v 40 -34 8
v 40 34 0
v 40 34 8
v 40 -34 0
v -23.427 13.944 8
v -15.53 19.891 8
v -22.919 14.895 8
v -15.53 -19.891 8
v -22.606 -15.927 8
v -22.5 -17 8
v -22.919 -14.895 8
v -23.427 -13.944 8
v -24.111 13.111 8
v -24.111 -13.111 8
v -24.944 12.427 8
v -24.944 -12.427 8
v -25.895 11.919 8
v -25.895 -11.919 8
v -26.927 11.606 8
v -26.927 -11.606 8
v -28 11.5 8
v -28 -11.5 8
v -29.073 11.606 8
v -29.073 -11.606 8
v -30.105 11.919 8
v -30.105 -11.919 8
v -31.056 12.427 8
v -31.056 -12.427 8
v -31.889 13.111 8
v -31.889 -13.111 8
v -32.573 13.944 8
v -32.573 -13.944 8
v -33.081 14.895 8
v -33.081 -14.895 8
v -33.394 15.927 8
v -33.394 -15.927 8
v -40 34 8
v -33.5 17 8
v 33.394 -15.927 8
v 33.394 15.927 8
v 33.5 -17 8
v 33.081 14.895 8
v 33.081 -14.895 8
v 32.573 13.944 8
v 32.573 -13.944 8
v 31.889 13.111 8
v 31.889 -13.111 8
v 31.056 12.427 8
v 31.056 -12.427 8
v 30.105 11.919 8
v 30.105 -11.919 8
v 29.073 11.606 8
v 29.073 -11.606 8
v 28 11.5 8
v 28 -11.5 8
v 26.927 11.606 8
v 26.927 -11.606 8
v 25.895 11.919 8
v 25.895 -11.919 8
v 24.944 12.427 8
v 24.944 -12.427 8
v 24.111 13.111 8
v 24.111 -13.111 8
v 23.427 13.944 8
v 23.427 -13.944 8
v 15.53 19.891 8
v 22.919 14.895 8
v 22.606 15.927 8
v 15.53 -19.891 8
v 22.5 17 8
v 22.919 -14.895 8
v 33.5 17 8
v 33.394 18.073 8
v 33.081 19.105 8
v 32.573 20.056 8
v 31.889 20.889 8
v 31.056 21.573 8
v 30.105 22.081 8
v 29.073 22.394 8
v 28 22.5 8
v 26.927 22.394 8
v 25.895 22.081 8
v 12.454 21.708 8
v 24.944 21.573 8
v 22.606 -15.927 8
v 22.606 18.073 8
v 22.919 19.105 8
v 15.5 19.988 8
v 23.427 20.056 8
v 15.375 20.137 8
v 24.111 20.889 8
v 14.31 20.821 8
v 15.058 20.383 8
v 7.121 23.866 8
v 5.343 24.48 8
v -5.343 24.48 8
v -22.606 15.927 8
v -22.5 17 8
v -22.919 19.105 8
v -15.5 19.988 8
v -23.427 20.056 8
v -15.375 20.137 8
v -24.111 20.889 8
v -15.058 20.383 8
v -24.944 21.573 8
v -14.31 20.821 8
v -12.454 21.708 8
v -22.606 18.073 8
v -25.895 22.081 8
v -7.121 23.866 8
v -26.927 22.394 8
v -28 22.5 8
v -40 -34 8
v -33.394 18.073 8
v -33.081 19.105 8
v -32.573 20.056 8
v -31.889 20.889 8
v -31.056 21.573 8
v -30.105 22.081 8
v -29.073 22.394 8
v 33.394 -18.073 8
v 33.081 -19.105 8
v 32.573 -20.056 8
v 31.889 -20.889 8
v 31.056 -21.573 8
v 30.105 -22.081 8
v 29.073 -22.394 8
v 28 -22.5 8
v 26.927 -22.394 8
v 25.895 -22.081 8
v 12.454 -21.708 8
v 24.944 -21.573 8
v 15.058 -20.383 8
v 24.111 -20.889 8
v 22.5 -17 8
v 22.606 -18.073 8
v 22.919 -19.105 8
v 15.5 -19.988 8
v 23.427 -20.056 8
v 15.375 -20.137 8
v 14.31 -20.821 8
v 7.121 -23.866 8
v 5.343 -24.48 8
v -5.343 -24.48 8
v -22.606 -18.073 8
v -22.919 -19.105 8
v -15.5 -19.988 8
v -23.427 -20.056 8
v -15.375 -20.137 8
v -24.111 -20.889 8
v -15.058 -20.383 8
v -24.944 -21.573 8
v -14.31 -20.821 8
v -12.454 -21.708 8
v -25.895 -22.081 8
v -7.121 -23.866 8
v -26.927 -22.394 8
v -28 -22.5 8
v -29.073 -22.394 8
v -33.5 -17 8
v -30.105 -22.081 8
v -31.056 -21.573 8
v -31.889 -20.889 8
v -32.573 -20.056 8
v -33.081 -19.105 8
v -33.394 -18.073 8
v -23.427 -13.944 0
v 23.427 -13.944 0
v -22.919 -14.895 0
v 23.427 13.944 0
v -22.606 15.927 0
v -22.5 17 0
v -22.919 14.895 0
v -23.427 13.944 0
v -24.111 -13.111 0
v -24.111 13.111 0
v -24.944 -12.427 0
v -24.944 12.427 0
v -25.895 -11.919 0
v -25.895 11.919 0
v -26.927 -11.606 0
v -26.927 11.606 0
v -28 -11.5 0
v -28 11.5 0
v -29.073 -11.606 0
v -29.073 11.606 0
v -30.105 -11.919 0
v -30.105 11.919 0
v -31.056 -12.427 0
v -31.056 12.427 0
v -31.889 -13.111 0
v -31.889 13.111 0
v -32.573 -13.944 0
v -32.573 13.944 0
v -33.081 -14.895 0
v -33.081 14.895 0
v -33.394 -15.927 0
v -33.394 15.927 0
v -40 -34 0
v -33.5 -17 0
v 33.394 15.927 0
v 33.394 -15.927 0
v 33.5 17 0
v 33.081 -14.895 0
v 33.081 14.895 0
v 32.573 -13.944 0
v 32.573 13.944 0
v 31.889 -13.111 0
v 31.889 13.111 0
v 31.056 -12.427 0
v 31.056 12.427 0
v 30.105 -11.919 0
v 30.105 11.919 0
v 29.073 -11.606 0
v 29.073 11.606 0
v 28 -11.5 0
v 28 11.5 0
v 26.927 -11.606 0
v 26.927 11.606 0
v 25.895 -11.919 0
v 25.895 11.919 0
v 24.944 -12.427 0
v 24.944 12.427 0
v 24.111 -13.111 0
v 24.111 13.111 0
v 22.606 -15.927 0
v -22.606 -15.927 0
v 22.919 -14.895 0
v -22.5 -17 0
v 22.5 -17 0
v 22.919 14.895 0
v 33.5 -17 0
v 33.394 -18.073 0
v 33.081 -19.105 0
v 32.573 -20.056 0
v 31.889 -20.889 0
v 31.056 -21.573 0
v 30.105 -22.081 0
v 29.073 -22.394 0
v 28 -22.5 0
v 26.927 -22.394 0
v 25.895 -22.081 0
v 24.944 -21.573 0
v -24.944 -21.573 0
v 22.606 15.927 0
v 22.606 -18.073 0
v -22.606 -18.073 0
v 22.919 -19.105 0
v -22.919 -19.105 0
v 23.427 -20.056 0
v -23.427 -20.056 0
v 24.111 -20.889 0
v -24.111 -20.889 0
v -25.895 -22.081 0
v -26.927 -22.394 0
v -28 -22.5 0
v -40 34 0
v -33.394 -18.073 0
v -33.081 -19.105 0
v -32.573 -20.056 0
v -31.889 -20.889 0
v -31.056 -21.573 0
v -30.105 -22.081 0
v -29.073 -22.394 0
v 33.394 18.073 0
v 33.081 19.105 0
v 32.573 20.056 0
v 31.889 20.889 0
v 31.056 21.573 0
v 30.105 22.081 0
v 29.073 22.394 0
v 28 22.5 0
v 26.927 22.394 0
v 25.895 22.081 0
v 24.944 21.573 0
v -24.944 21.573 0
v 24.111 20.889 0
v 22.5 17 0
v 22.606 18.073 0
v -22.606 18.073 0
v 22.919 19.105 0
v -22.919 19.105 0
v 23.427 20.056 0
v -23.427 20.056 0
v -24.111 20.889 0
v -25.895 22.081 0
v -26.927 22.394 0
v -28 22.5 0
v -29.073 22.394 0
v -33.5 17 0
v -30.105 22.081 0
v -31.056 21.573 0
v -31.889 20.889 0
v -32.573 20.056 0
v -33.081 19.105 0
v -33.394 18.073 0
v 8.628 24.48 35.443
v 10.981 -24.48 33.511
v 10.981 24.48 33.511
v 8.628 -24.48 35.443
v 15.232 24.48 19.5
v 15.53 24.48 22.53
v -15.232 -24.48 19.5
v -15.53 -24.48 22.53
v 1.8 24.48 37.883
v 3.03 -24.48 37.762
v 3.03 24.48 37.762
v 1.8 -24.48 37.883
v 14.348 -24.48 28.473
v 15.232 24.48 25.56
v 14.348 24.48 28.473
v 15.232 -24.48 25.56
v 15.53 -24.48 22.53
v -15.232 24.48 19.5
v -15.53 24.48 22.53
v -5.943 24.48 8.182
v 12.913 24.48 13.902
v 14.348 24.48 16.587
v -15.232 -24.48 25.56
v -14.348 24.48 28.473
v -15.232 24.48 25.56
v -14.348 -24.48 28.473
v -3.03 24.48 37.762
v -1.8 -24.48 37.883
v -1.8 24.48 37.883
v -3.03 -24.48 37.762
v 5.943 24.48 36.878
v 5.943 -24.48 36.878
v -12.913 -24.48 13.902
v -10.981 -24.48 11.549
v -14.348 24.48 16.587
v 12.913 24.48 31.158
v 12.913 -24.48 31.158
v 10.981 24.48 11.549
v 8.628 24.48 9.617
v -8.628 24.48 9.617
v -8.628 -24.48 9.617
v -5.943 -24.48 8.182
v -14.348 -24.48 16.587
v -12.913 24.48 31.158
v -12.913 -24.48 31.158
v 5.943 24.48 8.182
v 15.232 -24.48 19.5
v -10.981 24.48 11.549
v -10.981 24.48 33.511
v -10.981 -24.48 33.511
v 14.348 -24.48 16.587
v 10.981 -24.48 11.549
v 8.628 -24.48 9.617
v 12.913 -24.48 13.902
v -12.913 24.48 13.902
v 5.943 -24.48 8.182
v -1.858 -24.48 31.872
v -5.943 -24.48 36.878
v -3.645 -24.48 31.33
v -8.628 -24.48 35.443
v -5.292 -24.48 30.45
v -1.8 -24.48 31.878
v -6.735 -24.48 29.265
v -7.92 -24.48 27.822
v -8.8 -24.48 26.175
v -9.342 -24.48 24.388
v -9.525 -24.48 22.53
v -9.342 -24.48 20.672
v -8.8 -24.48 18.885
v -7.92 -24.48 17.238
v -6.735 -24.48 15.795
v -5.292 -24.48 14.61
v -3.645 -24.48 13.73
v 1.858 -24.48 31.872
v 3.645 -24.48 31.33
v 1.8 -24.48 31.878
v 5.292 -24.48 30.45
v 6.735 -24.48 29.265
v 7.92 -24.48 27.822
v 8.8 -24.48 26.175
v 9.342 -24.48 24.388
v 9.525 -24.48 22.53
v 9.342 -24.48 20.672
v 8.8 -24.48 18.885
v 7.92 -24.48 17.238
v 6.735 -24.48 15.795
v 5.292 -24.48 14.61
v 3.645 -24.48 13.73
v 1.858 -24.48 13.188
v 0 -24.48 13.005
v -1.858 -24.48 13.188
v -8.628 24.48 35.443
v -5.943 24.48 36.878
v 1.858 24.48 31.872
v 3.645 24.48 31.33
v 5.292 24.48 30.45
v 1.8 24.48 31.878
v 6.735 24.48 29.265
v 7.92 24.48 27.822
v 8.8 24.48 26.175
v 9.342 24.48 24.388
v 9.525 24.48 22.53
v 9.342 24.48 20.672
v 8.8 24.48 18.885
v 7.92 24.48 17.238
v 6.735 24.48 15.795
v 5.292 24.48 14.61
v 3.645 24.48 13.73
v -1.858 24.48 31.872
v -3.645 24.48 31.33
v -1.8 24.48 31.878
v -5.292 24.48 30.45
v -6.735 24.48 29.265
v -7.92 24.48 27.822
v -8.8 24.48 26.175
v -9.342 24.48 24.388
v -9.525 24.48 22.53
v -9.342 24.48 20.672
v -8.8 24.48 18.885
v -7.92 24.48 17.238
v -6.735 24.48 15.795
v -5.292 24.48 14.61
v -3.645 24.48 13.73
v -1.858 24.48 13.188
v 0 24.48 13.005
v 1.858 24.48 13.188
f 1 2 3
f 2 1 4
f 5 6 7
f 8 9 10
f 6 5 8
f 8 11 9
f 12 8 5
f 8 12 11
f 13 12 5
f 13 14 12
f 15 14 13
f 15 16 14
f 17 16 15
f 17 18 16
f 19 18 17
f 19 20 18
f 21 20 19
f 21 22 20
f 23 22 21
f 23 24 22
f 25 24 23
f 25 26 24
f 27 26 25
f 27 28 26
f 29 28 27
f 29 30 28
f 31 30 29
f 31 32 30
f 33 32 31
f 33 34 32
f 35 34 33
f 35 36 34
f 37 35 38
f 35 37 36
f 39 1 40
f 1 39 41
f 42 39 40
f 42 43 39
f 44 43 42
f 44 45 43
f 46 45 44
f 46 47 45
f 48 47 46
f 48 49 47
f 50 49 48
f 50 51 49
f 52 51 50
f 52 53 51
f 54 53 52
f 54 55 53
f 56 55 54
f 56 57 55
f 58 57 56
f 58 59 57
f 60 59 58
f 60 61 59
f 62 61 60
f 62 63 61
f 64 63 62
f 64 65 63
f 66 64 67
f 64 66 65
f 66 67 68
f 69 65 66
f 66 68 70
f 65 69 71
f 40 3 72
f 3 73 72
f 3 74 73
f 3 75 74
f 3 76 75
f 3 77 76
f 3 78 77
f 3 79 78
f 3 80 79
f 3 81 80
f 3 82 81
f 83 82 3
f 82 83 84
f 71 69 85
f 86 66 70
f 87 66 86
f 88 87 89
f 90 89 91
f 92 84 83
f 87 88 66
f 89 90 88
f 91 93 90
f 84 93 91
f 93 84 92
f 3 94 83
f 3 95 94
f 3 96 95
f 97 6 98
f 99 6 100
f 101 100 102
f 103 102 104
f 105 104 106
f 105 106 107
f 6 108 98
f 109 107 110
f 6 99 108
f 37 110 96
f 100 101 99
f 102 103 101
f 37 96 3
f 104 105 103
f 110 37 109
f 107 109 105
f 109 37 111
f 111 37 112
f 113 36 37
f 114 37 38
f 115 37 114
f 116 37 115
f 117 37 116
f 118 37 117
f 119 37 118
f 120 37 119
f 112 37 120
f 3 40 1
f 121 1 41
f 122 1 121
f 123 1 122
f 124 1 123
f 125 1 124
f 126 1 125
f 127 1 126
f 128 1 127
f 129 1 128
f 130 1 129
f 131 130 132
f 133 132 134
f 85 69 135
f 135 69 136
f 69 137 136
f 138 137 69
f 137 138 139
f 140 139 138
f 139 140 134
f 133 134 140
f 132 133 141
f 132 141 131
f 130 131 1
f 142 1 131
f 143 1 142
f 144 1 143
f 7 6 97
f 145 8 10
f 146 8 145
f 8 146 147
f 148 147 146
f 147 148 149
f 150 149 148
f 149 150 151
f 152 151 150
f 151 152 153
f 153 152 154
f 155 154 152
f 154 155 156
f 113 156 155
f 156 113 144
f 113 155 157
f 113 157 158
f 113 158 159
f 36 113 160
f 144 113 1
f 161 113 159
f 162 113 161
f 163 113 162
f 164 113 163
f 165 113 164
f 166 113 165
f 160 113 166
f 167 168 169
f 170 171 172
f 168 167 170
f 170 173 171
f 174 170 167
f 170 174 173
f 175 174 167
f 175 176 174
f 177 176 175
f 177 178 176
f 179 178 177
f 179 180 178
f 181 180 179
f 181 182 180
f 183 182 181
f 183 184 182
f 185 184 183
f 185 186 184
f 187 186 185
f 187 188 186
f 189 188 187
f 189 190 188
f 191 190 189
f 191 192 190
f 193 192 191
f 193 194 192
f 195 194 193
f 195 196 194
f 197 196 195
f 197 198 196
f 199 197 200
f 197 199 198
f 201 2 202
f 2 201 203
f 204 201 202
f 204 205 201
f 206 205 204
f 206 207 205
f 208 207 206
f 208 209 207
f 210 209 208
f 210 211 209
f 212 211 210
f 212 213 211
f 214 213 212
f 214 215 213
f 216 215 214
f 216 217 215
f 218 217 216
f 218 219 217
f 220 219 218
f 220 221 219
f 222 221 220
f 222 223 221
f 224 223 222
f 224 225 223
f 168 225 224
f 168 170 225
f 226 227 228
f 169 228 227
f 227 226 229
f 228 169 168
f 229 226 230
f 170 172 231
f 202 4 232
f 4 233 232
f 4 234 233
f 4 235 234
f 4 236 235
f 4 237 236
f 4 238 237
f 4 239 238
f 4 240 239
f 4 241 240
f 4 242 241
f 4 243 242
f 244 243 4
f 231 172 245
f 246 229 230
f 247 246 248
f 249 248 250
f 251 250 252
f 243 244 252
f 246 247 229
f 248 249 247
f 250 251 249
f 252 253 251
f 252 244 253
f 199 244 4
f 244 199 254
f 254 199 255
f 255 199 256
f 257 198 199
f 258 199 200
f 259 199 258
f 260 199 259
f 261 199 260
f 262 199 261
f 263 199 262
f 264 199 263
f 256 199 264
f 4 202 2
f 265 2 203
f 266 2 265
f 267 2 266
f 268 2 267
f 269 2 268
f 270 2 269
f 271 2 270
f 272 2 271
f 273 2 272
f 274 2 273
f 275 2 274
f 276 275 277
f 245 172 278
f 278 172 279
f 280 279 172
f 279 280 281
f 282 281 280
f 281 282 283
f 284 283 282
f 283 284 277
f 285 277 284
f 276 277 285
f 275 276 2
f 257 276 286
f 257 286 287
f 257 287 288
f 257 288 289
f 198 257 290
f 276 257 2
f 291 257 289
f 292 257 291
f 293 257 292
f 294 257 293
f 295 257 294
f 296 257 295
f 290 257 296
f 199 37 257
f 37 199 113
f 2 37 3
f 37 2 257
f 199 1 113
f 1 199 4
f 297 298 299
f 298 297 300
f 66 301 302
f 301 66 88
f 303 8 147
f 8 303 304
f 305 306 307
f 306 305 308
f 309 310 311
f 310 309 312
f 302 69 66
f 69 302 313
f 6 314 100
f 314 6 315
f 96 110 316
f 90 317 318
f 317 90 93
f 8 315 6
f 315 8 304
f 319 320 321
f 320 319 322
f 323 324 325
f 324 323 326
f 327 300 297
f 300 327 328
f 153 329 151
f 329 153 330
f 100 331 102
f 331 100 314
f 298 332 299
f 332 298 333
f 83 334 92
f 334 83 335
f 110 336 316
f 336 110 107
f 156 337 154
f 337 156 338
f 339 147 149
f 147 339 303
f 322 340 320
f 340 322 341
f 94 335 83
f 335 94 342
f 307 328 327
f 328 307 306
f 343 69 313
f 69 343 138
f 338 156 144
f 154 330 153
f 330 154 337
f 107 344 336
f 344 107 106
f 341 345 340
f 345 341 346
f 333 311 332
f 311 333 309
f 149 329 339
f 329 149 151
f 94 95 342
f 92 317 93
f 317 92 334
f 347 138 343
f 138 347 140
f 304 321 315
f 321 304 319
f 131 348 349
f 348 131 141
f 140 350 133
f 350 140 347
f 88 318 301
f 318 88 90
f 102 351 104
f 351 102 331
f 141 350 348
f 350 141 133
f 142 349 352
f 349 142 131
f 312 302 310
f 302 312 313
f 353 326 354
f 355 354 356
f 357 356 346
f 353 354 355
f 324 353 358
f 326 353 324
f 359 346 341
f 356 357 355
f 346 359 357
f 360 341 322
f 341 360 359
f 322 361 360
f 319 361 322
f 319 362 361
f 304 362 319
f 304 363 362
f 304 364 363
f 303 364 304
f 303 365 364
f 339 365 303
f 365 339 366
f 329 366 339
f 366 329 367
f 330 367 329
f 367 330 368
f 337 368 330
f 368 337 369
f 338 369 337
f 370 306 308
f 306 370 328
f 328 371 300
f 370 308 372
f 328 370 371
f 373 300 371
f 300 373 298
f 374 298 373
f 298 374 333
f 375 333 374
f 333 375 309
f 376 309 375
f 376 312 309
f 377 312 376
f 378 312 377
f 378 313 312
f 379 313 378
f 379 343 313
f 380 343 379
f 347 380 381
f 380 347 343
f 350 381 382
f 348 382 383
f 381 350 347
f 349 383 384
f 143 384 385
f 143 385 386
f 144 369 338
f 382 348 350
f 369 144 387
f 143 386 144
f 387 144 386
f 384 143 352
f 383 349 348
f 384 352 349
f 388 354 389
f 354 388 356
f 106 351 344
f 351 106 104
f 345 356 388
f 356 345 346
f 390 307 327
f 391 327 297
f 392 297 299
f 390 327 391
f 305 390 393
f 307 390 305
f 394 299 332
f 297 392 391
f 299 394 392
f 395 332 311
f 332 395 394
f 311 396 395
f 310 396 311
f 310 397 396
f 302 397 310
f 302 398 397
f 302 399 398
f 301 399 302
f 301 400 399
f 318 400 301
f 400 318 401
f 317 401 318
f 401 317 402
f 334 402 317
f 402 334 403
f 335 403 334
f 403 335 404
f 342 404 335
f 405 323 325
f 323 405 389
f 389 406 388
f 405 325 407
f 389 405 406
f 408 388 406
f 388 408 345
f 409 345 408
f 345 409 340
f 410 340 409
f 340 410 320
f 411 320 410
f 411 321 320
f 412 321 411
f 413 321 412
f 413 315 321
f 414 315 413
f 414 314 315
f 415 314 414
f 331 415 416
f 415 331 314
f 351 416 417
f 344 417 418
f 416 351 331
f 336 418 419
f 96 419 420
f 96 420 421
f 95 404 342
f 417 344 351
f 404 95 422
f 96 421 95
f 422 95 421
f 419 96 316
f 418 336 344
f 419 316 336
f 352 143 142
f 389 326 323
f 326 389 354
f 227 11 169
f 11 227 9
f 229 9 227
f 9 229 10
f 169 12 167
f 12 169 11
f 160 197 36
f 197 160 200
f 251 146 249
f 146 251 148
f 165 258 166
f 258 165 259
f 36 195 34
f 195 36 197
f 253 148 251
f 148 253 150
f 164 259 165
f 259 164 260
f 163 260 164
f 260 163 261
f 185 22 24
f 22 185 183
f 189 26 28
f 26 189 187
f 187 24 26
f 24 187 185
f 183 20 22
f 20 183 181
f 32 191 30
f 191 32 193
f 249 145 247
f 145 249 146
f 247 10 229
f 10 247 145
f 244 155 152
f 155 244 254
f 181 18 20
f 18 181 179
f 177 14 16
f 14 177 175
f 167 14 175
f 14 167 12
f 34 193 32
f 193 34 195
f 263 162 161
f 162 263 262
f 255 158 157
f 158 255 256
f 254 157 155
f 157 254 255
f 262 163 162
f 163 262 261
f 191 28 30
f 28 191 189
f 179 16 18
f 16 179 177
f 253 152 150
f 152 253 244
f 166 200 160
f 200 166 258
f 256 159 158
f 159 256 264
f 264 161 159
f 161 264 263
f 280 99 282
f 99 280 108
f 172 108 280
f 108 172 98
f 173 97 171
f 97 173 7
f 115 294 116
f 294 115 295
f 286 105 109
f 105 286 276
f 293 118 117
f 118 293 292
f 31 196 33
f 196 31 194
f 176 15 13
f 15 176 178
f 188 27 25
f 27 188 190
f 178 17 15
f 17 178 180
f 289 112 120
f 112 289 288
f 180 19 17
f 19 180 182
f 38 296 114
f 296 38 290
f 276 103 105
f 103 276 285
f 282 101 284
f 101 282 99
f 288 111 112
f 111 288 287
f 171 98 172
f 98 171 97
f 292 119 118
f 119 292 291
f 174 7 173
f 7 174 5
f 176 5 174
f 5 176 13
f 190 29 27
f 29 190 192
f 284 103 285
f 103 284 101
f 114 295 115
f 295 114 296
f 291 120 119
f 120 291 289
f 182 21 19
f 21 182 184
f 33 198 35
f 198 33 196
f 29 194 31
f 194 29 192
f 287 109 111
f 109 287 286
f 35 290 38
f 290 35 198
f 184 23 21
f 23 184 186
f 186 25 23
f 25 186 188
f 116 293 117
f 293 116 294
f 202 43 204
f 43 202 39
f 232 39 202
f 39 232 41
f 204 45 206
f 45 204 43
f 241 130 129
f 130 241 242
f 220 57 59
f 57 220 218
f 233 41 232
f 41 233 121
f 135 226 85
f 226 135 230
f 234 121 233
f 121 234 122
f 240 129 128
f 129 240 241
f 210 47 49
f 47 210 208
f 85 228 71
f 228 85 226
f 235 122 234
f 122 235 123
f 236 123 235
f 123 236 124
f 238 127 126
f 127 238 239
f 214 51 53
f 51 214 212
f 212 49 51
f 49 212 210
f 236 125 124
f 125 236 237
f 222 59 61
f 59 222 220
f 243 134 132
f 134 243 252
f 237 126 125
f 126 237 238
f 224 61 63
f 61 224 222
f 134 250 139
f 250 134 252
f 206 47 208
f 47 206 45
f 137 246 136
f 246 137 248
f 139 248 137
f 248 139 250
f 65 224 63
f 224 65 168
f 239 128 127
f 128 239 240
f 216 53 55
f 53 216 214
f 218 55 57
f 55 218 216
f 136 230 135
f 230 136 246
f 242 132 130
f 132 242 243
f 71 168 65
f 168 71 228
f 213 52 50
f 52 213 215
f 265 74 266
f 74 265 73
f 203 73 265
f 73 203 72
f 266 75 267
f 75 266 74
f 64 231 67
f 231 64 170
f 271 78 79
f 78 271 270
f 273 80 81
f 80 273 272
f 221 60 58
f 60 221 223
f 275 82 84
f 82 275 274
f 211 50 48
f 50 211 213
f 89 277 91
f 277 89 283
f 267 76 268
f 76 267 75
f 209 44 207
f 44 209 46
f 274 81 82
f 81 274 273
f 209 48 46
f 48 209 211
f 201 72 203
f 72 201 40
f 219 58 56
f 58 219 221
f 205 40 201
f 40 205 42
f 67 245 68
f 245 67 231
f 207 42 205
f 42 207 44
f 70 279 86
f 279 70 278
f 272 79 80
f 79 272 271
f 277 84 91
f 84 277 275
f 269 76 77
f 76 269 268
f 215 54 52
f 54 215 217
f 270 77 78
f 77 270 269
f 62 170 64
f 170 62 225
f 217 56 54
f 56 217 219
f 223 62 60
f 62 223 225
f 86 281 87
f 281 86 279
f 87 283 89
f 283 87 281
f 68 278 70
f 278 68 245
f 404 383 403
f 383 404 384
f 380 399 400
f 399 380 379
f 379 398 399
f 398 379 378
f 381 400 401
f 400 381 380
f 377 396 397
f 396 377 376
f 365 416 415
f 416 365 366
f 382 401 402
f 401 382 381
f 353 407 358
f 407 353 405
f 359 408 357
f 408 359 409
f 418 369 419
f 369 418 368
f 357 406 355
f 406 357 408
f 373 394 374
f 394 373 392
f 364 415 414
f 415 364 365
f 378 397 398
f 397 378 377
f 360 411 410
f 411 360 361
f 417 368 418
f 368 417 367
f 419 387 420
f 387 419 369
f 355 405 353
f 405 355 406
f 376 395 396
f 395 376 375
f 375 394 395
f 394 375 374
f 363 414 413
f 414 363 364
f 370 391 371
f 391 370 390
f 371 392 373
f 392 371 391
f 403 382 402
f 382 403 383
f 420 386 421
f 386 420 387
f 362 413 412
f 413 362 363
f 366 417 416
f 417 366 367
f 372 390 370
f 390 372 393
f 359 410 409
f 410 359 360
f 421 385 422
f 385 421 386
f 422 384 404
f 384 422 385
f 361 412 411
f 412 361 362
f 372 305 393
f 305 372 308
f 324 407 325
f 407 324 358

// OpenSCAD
$fn = 32;

// ----------------------------------------------------------------------
// Bearing block: 80 x 68 mm base, 19.05 mm bore at 22.53 mm
// ----------------------------------------------------------------------

// --- parameters (mm) ---
base_w = 80;              // base width
base_d = 68;              // base depth
base_t = 8;               // base thickness
bore_d = 19.05;           // shaft / bearing bore
house_r = 15.53;          // housing outer radius
house_len = 48.96;        // housing length along the shaft
foot_w = 31.06;           // foot width under the housing
foot_len = 38.96;         // foot length along the shaft
axis_z = 22.53;           // bore axis height above the base
holes_d = 11;             // mounting holes
hole_x = 28;              // mounting hole spacing
groove_w = 3.6;           // oil groove width

difference() {
  union() {
    /* base plate with its underside on z = 0 */
    translate([0, 0, base_t / 2]) cube([base_w, base_d, base_t], center = true);
    /* hull foot: a straight web blending into the round housing */
    hull() {
      translate([0, 0, base_t - 0.5]) cube([foot_w, foot_len, 1.6], center = true);
      translate([0, 0, axis_z]) rotate([-90, 0, 0]) cylinder(h = house_len, d = 2 * house_r, center = true);
    }
  }
  /* bore through the housing, 2.5 mm clear on both sides */
  translate([0, 0, axis_z]) rotate([-90, 0, 0]) cylinder(h = house_len + 5, d = bore_d, center = true);
  /* oil groove from the top of the housing into the bore */
  translate([-groove_w / 2, -house_len / 2 - 2.5, axis_z + bore_d * 0.17]) cube([groove_w, house_len + 5, house_r + 5]);
  /* mounting holes through the base plate */
  for (hx = [-28, 28]) {
    for (hy = [-17, 17]) {
      translate([hx, hy, -2.5]) cylinder(h = base_t + 5, d = holes_d);
    }
  }
}
